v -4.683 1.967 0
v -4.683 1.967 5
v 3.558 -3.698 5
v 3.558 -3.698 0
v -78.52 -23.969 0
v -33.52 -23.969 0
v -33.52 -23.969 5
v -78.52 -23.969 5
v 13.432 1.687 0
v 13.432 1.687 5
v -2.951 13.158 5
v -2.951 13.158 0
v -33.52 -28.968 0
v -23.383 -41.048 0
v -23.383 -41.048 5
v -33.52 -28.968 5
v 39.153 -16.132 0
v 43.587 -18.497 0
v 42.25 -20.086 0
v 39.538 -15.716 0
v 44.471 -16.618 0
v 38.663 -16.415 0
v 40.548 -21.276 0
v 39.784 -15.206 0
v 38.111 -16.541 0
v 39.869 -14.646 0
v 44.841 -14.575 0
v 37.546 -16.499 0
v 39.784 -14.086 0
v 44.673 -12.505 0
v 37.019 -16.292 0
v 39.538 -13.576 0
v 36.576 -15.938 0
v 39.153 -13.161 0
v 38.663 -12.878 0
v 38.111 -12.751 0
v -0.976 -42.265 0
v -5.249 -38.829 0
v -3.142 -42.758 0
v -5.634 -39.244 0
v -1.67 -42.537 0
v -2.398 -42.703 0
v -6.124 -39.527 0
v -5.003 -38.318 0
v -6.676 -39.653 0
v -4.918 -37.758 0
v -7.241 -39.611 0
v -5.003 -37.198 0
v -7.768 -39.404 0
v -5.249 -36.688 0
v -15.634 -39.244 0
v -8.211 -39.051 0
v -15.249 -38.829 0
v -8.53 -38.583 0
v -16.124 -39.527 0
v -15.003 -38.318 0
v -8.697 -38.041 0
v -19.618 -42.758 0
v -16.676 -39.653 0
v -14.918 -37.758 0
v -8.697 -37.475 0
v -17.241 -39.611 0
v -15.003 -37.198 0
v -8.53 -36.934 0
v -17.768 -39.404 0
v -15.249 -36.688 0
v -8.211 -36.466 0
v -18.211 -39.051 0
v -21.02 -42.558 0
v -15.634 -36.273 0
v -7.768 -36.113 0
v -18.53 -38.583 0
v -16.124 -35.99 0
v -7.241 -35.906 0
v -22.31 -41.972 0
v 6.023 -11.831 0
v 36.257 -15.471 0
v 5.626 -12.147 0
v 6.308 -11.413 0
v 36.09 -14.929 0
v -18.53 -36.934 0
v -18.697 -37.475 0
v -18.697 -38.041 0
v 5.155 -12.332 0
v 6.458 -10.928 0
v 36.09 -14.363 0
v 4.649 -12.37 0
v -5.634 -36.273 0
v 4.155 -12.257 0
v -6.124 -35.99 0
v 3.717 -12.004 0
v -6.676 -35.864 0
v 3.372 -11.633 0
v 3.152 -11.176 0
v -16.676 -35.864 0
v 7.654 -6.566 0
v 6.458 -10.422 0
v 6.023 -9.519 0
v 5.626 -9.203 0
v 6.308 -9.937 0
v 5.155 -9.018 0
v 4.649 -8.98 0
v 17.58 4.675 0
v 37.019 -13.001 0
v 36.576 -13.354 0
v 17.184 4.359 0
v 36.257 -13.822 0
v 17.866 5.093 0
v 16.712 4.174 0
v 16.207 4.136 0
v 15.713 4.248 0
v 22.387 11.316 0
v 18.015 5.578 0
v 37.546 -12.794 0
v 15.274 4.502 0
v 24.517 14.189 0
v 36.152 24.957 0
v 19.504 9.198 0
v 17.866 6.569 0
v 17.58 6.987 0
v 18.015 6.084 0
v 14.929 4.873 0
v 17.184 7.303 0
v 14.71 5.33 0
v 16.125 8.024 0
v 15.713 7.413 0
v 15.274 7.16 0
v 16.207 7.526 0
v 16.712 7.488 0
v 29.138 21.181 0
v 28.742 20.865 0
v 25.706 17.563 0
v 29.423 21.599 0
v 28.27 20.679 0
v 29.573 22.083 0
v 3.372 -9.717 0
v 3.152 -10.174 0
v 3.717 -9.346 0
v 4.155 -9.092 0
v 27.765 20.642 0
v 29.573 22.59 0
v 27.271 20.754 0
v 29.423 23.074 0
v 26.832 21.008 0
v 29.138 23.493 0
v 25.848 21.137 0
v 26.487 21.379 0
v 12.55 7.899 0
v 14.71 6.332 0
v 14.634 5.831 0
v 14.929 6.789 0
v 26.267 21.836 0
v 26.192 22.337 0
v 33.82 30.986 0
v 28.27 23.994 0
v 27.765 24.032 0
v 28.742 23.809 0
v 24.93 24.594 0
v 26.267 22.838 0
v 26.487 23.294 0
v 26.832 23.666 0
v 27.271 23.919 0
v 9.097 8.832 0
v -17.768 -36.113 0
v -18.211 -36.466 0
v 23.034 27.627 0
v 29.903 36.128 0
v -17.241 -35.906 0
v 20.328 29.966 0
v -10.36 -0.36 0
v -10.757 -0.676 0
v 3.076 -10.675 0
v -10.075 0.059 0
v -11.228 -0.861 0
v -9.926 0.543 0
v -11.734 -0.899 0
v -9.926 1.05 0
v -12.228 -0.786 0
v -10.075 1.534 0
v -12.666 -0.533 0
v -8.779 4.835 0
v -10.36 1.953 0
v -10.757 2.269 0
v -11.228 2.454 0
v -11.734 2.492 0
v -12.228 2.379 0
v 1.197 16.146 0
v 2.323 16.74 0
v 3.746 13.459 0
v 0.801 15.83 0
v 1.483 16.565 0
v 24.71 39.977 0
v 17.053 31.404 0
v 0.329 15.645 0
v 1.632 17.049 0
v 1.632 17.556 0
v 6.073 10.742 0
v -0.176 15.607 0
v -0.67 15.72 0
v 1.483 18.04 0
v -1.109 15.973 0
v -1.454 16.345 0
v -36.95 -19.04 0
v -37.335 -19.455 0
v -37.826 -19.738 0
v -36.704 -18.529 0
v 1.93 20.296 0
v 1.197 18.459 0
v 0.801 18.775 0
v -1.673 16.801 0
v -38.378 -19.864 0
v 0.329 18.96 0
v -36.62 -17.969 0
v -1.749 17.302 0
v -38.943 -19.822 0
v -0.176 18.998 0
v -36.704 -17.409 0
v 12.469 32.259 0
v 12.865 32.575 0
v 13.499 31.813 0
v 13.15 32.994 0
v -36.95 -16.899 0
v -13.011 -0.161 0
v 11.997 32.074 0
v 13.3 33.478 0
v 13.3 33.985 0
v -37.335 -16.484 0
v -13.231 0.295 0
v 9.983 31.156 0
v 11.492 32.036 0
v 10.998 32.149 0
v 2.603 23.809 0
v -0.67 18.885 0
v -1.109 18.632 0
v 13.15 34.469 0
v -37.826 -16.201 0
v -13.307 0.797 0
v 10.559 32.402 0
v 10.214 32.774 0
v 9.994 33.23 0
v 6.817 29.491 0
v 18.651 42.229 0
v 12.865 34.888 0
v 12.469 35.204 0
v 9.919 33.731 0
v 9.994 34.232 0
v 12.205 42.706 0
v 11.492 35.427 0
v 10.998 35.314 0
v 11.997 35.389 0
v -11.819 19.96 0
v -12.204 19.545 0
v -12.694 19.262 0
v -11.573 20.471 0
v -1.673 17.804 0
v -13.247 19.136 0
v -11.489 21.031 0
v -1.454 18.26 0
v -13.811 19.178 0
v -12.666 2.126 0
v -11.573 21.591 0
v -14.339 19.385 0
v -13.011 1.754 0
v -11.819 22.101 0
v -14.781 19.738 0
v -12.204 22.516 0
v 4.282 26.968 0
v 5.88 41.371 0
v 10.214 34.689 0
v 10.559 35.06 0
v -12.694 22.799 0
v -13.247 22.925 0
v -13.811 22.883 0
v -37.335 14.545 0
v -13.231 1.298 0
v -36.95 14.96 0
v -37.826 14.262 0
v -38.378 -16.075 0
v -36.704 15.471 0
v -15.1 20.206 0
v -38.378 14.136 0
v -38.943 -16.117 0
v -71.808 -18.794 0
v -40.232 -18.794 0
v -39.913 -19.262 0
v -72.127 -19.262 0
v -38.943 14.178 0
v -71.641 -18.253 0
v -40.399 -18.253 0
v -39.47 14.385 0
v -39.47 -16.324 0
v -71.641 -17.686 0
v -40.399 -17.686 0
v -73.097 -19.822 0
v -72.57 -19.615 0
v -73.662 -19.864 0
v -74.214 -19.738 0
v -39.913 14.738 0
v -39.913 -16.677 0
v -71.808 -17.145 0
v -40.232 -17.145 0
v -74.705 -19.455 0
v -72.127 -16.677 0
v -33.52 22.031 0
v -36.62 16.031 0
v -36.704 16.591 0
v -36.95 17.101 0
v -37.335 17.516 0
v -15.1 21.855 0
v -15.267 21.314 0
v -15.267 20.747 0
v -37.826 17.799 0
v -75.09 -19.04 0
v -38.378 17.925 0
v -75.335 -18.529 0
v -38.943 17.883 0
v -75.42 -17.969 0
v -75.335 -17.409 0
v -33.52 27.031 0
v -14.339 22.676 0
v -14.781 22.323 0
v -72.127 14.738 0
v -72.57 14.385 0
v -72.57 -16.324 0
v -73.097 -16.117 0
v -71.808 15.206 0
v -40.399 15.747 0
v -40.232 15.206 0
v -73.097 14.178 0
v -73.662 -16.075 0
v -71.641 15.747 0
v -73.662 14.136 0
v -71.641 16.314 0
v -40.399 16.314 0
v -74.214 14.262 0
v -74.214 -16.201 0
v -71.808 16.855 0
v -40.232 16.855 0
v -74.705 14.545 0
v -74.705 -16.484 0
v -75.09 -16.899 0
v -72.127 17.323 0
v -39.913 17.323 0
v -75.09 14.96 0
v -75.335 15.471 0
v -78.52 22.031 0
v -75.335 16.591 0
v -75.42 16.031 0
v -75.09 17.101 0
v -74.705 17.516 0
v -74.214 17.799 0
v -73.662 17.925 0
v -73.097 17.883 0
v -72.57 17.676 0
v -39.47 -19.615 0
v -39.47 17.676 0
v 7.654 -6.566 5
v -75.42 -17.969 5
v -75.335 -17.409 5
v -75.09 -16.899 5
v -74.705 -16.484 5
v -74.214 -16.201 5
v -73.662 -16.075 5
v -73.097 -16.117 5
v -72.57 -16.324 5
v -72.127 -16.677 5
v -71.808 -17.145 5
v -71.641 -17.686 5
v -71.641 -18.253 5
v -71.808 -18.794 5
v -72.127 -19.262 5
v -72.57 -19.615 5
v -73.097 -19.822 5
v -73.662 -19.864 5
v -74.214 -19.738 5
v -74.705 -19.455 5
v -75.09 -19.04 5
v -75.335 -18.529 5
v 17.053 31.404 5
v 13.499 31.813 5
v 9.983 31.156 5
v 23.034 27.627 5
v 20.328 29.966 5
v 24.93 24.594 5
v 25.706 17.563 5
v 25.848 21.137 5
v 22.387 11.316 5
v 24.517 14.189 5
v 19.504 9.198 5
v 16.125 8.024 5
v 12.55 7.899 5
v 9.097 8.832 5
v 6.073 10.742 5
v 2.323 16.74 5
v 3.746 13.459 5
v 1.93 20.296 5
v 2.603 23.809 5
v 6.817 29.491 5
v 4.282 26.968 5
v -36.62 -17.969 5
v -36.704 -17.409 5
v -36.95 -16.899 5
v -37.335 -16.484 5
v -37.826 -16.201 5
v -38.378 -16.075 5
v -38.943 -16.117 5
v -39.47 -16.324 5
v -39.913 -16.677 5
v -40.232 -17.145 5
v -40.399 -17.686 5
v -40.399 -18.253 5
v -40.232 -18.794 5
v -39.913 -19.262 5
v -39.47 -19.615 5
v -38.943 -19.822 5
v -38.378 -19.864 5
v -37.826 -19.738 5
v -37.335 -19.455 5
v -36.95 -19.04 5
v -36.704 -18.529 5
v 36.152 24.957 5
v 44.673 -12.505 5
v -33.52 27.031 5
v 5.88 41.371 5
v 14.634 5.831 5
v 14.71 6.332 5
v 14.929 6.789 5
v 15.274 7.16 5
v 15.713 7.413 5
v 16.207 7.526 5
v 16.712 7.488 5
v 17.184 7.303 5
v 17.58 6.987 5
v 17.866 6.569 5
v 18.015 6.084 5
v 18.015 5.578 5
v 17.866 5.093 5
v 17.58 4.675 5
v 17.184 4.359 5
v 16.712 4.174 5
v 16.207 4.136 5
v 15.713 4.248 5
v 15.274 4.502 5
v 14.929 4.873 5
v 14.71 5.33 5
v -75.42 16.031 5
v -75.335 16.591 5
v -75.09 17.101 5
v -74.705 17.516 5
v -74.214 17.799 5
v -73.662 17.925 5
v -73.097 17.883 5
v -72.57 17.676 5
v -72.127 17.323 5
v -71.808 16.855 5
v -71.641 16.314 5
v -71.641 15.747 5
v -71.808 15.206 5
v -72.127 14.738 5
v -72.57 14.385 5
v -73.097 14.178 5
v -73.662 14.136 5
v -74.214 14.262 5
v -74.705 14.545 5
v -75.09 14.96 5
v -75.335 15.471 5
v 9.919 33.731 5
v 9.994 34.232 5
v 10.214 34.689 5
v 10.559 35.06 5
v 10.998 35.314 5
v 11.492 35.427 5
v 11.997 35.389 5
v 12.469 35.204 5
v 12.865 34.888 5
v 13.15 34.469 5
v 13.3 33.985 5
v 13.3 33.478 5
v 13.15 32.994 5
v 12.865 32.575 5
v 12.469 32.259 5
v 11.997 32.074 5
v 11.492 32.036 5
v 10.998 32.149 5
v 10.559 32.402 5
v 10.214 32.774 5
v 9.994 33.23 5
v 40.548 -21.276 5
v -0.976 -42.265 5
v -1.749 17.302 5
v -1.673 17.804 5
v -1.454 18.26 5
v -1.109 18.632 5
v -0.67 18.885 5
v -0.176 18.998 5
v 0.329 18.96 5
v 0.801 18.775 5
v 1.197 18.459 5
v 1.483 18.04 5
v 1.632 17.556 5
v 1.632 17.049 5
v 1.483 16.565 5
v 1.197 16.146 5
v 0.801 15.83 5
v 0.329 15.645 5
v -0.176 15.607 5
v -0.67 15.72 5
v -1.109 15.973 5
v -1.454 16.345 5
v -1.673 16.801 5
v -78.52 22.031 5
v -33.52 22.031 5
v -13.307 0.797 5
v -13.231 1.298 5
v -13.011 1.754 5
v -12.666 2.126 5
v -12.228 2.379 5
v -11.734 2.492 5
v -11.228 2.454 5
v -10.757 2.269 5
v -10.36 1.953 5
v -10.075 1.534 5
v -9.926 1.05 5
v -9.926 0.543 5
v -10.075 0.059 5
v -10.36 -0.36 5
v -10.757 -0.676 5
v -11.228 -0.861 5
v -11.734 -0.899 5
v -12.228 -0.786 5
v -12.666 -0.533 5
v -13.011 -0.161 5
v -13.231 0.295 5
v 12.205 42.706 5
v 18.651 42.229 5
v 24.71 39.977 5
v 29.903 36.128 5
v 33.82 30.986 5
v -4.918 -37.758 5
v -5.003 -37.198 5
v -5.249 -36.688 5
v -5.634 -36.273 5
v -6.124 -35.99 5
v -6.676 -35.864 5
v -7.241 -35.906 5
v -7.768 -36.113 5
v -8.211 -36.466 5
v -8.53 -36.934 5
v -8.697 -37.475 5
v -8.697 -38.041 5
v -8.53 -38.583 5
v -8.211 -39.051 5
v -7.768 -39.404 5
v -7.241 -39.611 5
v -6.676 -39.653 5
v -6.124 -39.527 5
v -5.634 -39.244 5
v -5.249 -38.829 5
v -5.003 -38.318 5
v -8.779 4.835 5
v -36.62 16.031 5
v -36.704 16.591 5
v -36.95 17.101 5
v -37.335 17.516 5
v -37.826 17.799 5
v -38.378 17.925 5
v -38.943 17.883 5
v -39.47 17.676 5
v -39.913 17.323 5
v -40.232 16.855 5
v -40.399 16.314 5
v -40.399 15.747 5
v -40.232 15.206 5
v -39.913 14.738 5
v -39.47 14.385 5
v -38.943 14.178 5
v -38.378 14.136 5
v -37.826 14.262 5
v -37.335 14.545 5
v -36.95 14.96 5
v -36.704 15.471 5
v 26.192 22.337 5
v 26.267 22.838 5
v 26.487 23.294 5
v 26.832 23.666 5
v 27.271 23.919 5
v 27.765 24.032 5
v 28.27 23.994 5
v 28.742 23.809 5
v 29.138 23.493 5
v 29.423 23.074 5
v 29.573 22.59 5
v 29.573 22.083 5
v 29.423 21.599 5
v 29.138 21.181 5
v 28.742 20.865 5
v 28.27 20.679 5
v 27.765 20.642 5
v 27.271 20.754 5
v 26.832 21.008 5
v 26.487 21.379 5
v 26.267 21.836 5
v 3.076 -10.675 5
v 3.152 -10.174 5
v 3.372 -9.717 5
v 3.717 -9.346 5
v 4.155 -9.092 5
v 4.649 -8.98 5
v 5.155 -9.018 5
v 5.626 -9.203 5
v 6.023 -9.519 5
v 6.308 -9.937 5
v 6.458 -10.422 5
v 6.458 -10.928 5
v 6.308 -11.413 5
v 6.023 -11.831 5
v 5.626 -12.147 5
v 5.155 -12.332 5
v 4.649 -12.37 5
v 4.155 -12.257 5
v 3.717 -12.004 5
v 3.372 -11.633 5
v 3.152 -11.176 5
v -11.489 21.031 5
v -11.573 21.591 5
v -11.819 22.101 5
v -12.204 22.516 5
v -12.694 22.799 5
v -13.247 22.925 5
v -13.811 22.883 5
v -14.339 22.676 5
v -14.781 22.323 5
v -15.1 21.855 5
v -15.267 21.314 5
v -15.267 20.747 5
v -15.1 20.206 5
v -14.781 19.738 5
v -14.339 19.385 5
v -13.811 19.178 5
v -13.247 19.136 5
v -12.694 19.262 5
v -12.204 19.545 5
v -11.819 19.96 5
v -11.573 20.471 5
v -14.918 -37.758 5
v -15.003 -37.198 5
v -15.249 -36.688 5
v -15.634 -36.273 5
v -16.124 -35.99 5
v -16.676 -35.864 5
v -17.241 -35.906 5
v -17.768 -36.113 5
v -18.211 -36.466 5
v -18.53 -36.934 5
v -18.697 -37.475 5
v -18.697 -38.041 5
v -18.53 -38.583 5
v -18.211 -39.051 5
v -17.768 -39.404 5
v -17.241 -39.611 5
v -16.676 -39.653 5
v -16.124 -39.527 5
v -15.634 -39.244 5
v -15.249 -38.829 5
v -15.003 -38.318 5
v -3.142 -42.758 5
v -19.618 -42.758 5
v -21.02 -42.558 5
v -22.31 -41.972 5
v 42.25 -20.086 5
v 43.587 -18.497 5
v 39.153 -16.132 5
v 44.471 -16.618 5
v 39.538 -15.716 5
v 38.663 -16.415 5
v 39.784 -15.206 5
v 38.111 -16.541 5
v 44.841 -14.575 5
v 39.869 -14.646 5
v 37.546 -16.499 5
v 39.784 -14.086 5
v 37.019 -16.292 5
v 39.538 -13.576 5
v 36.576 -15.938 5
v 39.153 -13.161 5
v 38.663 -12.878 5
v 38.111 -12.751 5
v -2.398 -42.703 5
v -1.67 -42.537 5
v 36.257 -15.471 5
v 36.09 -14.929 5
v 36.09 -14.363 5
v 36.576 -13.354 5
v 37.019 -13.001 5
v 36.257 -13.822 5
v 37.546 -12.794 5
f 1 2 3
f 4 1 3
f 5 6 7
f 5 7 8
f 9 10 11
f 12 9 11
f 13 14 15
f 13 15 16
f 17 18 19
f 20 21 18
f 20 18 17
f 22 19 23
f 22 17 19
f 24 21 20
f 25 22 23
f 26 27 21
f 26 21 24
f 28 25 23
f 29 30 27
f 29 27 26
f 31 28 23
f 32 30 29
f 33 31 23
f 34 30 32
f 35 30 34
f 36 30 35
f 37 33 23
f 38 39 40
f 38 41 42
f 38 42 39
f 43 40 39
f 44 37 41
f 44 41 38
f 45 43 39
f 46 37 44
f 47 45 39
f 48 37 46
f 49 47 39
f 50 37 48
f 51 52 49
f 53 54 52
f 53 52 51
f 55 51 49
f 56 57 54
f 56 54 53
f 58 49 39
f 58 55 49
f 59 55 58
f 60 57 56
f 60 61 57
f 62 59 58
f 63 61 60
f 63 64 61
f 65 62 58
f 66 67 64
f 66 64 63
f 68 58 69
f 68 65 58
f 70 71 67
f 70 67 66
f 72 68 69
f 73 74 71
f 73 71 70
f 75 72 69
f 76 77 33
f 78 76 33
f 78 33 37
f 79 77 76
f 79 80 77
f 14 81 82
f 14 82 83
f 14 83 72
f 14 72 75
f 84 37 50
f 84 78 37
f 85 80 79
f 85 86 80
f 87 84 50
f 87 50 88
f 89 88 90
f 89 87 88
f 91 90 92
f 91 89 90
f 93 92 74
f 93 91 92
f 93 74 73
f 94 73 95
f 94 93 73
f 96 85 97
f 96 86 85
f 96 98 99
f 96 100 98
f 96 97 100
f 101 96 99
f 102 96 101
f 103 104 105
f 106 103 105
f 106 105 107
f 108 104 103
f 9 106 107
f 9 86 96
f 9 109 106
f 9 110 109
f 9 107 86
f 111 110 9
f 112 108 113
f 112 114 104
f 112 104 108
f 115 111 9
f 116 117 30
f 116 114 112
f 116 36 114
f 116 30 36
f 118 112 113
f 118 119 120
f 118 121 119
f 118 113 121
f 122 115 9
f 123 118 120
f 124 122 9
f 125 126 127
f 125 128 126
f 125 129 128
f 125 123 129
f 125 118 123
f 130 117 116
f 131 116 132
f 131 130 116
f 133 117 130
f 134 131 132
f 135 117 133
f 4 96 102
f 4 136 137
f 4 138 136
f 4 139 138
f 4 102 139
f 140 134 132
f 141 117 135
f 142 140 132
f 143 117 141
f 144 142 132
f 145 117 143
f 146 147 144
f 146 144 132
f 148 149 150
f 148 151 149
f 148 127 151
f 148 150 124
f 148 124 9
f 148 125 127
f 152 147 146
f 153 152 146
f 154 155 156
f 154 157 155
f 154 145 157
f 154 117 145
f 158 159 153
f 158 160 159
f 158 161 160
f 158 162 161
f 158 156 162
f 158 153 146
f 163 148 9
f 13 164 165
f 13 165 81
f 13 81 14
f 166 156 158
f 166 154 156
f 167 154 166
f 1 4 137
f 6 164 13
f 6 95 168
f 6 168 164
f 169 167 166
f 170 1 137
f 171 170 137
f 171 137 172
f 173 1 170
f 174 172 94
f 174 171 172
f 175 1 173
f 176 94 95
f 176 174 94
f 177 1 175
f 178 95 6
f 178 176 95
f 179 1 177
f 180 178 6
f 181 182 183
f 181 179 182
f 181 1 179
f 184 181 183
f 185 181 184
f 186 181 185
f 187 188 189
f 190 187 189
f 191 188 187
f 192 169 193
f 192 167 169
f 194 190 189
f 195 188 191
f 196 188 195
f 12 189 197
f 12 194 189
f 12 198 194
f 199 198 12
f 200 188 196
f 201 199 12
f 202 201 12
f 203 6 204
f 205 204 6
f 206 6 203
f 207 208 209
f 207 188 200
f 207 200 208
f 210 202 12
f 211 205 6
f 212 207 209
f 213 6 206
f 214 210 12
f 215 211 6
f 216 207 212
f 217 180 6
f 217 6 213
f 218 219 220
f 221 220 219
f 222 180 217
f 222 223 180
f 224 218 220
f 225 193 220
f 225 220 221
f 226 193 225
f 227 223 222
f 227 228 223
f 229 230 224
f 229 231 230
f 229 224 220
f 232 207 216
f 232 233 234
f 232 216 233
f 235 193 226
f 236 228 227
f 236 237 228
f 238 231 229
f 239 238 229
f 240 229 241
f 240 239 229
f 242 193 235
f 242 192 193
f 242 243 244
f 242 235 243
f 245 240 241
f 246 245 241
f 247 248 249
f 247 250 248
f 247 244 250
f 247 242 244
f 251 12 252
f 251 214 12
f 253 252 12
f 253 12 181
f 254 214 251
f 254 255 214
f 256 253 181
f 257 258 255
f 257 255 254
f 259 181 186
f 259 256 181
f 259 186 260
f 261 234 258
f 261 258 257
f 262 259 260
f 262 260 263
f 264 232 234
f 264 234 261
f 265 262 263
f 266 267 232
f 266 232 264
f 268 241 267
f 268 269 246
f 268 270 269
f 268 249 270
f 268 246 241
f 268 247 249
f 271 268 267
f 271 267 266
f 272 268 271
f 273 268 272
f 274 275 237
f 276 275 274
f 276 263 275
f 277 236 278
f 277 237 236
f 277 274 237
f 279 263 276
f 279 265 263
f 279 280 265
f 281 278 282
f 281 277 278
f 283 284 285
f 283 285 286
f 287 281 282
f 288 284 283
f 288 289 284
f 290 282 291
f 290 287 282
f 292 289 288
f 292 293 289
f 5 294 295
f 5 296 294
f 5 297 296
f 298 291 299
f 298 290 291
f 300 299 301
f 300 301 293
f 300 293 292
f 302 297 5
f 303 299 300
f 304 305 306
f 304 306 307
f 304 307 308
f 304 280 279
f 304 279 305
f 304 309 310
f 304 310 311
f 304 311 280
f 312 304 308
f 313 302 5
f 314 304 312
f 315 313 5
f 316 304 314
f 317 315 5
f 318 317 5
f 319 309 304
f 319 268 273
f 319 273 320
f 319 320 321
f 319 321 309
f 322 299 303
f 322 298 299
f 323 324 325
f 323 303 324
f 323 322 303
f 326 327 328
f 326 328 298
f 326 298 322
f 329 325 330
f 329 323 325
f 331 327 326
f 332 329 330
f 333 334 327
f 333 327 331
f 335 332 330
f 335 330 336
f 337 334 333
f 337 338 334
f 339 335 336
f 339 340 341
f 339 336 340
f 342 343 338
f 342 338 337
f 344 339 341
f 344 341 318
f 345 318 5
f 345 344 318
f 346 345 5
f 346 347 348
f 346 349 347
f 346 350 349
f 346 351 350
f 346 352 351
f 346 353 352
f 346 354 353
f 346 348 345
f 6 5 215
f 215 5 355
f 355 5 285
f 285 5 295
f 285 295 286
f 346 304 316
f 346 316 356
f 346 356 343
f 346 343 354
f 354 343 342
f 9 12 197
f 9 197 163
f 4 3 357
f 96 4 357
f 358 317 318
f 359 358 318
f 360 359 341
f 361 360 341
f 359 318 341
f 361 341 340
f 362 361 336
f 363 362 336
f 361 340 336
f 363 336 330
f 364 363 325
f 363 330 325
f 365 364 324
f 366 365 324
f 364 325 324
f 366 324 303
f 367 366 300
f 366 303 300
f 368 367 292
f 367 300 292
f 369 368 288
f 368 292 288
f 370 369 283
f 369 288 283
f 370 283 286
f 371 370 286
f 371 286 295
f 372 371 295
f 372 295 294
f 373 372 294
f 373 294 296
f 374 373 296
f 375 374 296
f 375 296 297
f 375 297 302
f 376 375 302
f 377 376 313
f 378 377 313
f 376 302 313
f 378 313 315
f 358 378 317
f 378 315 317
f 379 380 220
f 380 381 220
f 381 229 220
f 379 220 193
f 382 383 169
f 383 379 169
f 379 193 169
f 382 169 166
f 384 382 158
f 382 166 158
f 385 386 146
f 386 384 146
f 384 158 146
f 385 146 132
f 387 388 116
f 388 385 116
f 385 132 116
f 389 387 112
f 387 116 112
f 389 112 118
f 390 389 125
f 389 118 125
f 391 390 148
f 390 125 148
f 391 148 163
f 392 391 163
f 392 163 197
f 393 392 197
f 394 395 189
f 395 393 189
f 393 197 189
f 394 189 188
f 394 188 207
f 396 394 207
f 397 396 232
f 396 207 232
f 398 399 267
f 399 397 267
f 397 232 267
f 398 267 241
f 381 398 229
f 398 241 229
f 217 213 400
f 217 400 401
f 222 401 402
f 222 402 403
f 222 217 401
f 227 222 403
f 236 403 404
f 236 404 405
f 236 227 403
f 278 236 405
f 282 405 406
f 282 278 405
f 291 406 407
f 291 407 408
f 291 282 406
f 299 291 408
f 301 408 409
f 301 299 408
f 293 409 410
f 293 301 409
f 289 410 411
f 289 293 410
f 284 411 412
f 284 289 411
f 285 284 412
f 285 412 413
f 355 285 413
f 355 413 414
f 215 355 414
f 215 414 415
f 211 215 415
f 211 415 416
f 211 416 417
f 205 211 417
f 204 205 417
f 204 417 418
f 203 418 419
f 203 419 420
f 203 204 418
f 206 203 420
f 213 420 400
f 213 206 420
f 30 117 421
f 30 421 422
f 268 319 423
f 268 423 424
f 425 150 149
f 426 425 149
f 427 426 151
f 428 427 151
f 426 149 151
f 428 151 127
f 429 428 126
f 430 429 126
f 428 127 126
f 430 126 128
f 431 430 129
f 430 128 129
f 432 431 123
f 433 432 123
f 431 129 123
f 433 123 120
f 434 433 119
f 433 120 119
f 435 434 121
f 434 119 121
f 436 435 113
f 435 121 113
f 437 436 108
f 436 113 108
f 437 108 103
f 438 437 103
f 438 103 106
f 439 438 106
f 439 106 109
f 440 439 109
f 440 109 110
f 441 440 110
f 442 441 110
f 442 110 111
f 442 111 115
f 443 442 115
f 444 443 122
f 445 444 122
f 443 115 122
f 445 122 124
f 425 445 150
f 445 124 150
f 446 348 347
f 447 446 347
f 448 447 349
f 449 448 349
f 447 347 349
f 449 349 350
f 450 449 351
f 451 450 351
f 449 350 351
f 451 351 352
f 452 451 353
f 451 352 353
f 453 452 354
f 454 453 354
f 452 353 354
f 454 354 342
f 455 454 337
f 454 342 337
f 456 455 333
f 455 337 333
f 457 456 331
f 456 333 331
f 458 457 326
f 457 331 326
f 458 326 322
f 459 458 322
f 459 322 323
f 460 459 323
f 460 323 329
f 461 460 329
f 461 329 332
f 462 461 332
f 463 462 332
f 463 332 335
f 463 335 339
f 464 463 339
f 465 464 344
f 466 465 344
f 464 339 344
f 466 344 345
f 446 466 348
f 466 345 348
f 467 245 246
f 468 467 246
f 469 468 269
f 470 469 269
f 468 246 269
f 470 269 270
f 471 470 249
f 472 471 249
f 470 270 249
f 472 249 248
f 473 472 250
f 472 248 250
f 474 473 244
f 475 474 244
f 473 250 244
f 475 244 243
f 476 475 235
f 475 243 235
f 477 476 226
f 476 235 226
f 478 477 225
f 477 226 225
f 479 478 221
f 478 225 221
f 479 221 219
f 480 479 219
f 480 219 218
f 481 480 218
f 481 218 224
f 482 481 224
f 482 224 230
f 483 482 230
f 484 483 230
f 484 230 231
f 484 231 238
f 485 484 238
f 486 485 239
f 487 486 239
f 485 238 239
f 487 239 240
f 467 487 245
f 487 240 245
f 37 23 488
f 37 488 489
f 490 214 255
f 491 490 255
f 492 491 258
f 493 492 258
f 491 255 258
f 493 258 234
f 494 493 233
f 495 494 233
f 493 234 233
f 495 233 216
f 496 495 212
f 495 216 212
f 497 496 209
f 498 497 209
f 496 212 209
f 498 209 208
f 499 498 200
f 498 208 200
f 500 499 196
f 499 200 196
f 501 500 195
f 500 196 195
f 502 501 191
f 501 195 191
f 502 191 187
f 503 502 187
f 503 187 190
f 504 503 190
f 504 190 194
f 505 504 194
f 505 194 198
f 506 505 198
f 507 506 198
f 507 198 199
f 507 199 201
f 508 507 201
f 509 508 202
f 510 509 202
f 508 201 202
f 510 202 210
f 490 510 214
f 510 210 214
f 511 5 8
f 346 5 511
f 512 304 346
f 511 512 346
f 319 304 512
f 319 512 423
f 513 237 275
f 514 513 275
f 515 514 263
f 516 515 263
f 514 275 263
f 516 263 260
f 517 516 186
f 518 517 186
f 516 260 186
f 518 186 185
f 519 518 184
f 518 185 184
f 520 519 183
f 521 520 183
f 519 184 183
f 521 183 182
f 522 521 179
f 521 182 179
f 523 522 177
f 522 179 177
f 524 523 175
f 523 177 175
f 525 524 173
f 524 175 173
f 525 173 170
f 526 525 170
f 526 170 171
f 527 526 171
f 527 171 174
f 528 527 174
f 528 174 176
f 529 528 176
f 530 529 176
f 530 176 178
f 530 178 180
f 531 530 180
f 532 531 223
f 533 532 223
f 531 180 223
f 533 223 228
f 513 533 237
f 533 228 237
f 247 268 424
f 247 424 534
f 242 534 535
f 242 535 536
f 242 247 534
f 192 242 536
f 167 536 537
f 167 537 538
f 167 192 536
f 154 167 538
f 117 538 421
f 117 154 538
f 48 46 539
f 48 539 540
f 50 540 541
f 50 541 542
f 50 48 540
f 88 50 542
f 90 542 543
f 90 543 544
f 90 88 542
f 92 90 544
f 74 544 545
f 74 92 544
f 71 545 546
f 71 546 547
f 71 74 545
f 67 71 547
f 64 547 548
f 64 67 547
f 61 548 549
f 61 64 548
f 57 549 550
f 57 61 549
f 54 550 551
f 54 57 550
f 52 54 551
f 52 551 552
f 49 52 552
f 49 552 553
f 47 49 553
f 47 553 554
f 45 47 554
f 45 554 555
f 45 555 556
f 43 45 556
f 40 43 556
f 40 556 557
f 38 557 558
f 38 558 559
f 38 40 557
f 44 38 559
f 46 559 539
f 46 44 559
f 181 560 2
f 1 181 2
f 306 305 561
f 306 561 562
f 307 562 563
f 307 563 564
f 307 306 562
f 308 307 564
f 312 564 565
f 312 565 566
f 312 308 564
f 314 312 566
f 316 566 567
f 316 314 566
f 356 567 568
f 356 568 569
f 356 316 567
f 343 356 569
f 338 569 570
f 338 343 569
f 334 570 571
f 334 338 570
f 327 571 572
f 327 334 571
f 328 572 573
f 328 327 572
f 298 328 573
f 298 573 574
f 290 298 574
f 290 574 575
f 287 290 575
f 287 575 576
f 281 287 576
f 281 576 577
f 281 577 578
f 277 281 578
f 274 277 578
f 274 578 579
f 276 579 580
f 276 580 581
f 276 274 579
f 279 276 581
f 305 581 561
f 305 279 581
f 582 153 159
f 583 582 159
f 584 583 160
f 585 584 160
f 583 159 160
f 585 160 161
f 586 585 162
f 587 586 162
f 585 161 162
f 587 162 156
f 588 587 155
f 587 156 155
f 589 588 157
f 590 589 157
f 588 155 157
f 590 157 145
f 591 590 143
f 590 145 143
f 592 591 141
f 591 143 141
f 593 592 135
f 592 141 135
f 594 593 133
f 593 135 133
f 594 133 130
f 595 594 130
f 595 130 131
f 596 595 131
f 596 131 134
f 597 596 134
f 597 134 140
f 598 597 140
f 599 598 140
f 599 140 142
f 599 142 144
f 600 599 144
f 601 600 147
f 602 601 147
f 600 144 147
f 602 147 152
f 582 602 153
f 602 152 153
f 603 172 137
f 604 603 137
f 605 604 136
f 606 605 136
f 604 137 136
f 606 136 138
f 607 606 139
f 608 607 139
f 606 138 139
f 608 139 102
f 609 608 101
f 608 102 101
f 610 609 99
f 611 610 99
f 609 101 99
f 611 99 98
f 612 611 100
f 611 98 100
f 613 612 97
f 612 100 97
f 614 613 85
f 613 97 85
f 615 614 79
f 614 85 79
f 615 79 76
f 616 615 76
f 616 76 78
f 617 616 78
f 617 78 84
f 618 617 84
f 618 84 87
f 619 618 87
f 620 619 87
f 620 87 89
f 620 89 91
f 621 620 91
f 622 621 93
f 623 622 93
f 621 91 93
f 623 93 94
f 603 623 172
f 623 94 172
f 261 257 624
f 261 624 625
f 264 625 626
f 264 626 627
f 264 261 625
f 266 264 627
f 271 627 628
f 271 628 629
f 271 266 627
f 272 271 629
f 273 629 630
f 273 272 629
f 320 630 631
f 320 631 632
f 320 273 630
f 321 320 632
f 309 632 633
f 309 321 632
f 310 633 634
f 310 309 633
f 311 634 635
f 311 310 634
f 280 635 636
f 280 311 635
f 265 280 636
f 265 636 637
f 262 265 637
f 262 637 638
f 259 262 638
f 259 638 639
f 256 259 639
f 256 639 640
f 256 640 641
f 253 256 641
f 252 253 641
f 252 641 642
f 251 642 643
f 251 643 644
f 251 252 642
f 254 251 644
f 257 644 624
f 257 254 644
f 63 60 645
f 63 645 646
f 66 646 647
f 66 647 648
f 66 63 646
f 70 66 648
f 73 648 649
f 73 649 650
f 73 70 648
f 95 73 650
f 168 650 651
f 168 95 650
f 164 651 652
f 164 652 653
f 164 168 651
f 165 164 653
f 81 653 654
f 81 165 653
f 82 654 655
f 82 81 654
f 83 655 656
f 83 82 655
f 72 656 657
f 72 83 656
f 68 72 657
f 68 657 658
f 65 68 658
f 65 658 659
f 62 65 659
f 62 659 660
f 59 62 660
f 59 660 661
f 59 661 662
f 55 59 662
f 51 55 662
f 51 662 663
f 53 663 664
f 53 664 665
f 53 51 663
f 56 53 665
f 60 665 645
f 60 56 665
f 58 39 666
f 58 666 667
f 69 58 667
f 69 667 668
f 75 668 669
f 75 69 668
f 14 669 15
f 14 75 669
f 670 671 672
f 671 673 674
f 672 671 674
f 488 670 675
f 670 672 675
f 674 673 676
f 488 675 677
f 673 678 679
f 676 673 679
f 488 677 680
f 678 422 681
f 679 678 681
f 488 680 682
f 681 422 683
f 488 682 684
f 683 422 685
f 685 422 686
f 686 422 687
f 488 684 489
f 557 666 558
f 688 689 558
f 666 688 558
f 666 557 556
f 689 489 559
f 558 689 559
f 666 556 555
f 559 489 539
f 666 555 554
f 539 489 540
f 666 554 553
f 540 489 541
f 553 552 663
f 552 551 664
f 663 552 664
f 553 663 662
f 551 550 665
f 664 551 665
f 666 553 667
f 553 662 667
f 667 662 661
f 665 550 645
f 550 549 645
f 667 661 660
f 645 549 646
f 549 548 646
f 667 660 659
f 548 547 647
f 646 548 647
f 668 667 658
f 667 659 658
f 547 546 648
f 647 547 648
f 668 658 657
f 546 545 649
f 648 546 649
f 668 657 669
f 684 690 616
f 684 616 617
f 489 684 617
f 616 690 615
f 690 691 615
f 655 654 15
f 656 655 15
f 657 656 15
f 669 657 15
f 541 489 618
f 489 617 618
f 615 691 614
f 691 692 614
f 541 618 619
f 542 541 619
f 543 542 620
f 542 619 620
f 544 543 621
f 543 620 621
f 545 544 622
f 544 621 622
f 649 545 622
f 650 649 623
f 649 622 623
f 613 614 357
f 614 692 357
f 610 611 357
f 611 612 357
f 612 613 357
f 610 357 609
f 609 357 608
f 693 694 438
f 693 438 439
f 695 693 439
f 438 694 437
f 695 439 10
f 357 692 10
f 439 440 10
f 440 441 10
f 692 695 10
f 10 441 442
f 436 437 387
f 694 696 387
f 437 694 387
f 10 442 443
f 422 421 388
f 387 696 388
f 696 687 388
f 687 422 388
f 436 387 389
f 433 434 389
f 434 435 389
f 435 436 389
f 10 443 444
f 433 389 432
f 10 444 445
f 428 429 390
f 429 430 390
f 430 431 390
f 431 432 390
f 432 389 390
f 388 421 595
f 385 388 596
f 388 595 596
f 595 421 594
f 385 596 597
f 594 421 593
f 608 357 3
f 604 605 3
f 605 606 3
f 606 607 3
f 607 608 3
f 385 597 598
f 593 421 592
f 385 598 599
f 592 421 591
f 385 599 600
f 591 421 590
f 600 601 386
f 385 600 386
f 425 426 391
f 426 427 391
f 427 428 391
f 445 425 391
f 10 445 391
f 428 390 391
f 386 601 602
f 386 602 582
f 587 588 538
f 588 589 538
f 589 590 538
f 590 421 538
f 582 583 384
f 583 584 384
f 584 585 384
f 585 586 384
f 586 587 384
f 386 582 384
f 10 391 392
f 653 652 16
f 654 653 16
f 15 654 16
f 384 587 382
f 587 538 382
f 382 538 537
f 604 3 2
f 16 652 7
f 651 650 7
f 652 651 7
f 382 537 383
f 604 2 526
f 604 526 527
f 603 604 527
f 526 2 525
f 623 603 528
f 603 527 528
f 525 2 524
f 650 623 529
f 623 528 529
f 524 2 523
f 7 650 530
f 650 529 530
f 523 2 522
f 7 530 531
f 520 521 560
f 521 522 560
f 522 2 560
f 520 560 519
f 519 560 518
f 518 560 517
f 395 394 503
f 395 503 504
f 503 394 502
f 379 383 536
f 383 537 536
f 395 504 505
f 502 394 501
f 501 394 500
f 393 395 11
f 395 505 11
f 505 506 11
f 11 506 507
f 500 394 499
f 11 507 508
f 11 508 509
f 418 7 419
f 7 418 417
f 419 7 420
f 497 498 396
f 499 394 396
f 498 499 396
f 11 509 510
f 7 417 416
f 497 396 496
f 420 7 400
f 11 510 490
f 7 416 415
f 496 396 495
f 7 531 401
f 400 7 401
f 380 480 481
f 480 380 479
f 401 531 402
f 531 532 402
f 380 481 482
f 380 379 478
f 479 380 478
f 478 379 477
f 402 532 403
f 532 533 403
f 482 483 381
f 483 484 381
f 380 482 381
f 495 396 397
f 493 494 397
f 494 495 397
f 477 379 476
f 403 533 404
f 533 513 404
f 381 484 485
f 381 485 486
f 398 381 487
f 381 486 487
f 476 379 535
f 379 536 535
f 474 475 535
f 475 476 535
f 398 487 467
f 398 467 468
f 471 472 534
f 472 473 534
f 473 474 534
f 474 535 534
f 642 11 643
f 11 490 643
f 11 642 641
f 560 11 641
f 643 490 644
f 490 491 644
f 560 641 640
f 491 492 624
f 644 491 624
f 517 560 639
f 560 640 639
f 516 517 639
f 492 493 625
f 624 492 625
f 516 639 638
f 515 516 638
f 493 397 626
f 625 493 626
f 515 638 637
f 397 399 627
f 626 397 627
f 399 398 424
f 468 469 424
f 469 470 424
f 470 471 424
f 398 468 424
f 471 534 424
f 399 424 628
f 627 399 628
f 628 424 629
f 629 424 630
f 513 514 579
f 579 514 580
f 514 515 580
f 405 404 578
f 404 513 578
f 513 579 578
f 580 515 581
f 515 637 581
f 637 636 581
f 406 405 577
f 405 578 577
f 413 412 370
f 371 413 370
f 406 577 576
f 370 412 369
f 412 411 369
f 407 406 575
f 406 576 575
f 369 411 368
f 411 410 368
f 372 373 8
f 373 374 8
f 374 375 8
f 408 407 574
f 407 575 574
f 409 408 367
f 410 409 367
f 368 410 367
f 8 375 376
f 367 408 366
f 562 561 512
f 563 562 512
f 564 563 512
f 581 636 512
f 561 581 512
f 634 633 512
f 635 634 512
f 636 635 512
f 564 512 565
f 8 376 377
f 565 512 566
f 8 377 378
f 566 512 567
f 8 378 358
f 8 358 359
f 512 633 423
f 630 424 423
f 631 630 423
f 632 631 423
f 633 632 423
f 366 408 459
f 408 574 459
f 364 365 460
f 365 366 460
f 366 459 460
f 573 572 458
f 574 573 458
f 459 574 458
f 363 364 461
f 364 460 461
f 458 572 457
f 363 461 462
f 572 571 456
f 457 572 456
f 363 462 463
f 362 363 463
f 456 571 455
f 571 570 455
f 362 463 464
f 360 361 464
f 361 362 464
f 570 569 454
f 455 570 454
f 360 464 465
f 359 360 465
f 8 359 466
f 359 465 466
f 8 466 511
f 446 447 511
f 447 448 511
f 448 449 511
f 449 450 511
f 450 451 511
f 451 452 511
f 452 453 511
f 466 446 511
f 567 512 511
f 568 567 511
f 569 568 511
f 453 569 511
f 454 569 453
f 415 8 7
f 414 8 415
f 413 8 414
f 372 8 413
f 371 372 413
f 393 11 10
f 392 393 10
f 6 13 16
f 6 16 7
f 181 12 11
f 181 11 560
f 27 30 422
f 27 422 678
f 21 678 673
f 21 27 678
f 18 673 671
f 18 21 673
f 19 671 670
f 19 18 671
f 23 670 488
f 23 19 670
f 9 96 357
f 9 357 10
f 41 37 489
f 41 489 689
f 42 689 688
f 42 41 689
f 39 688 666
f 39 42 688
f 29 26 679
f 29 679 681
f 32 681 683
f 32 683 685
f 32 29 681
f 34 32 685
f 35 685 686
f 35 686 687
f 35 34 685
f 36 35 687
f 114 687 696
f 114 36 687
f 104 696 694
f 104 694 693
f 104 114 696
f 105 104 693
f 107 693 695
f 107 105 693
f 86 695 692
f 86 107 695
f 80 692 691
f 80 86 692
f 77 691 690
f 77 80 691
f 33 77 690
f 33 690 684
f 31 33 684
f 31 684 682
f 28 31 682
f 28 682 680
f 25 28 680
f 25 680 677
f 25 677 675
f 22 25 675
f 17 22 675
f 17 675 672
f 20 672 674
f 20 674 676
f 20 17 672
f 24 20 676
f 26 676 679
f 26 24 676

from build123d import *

# Parameters (mm, degrees)
ESQUISSE1_R         = 1.9
BOSS_EXTRU_1_DEPTH  = 5
EXTRUDE_1_DEPTH     = 5
EXTRUDE_2_DEPTH     = 5
SKETCH_6_R          = 1.6
CUT_EXTRUDE_2_DEPTH = 5
EXTRUDE_4_DEPTH     = 5
CUT_EXTRUDE_3_DEPTH = 5
EXTRUDE_6_DEPTH     = 5
SKETCH_10_R         = 12
CUT_EXTRUDE_4_DEPTH = 5
SKETCH_11_R         = 12.59581588
SKETCH_11_R_2       = 8.721789125
EXTRUDE_7_DEPTH     = 5
SKETCH_12_R         = 12
CUT_EXTRUDE_5_DEPTH = 5
SKETCH_13_R         = 3.051220473
SKETCH_13_R_2       = 0.885355671
SKETCH_13_R_3       = 2.495868873
SKETCH_13_R_4       = 0.973791961
EXTRUDE_8_DEPTH     = 5
SKETCH_14_R         = 1.6
SKETCH_14_R_2       = 12
CUT_EXTRUDE_6_DEPTH = 5
EXTRUDE_START       = -5
EXTRUDE_9_DEPTH     = 5
SKETCH_16_R         = 1.7
CUT_EXTRUDE_7_DEPTH = 5
SKETCH_17_W         = 35
SKETCH_17_H         = 46
EXTRUDE_10_DEPTH    = 5
SKETCH_18_R         = 1.9
CUT_EXTRUDE_8_DEPTH = 5


# Read off the part's stored shape, not the designer's step: 凸台-拉伸9
with BuildPart() as part:
    # Esquisse1 → Boss.-Extru.1 (new body)
    with BuildSketch(Plane.XY):
        with BuildLine():
            Line((40.548338426, -21.276277818), (-0.975727052, -42.264773686))
            ThreePointArc((-0.975727052, -42.264773686), (-2.030907408, -42.633295828), (-3.141586831, -42.758217285))
            Line((-3.141586831, -42.758217285), (-19.618188193, -42.758217285))
            ThreePointArc((-19.618188193, -42.758217285), (-21.685859542, -42.310660648), (-23.383370665, -41.048112535))
            Line((-23.383370665, -41.048112535), (-33.519906154, -28.967859949))
            Line((-33.519906154, -28.967859949), (-33.519906154, -23.969415955))
            Line((-33.519906154, -23.969415955), (-43.519906154, -23.969415955))
            Line((-43.519906154, -23.969415955), (-43.519906154, 22.030584045))
            Line((-43.519906154, 22.030584045), (-33.519906154, 22.030584045))
            Line((-33.519906154, 22.030584045), (-33.519906154, 27.030582734))
            Line((-33.519906154, 27.030582734), (5.8804708, 41.371147503))
            ThreePointArc((5.8804708, 41.371147503), (24.71028401, 39.977143129), (36.151646844, 24.957145453))
            Line((36.151646844, 24.957145453), (44.672795688, -12.50542283))
            ThreePointArc((44.672795688, -12.50542283), (44.089997655, -17.586546272), (40.548338426, -21.276277818))
        make_face()
        with Locations((37.968513549, -14.646168575)):
            Circle(ESQUISSE1_R, mode=Mode.SUBTRACT)
        with Locations((26.290921771, 28.768039745)):
            Circle(ESQUISSE1_R, mode=Mode.SUBTRACT)
        with Locations((18.099401328, 34.503804109)):
            Circle(ESQUISSE1_R, mode=Mode.SUBTRACT)
        with Locations((-1.81432361, -11.370410425)):
            Circle(ESQUISSE1_R, mode=Mode.SUBTRACT)
        with Locations((-10.005844053, -5.634646061)):
            Circle(ESQUISSE1_R, mode=Mode.SUBTRACT)
        with Locations((-13.38853652, 21.030583318)):
            Circle(ESQUISSE1_R, mode=Mode.SUBTRACT)
        with Locations((-6.818359545, -37.758216658)):
            Circle(ESQUISSE1_R, mode=Mode.SUBTRACT)
        with Locations((-16.818359545, -37.758216658)):
            Circle(ESQUISSE1_R, mode=Mode.SUBTRACT)
        with Locations((-38.519906154, -17.969415955)):
            Circle(ESQUISSE1_R, mode=Mode.SUBTRACT)
        with Locations((-38.519906154, 16.030584045)):
            Circle(ESQUISSE1_R, mode=Mode.SUBTRACT)
        with BuildLine():
            Line((21.617307412, 29.328732493), (24.05500749, 32.810128977))
            ThreePointArc((24.05500749, 32.810128977), (23.766600359, 33.932469516), (22.625252159, 33.732091761))
            Line((22.625252159, 33.732091761), (20.187552449, 30.250695803))
            ThreePointArc((20.187552449, 30.250695803), (18.892160946, 29.381199086), (17.366350313, 29.706722658))
            Line((17.366350313, 29.706722658), (11.508582376, 33.808377058))
            Line((11.508582376, 33.808377058), (-11.606548602, 0.796549047))
            Line((-11.606548602, 0.796549047), (-5.749613357, -3.304522496))
            ThreePointArc((-5.749613357, -3.304522496), (-4.927150936, -4.595530225), (-5.258462389, -6.089979325))
            Line((-5.258462389, -6.089979325), (-7.696162511, -9.571375872))
            ThreePointArc((-7.696162511, -9.571375872), (-7.487422906, -10.755197269), (-6.303601509, -10.546457664))
            Line((-6.303601509, -10.546457664), (-3.865901833, -7.065061754))
            ThreePointArc((-3.865901833, -7.065061754), (-2.574894061, -6.242599111), (-1.080444801, -6.573910562))
            Line((-1.080444801, -6.573910562), (4.776491193, -10.67498149))
            Line((4.776491193, -10.67498149), (27.891620971, 22.336844808))
            Line((27.891620971, 22.336844808), (22.031293977, 26.440291454))
            ThreePointArc((22.031293977, 26.440291454), (21.198678089, 27.79484445), (21.617307412, 29.328732493))
        make_face(mode=Mode.SUBTRACT)
    extrude(amount=BOSS_EXTRU_1_DEPTH)

    # 草图3 → 凸台-拉伸1 (add)
    with BuildSketch(Plane.XY.offset(5)):
        Polygon((17.366350313, 29.706722658), (22.031293977, 26.440291454), (27.521539946, 34.281169324), (22.856520703, 37.547606144), align=None)
    extrude(amount=-EXTRUDE_1_DEPTH)

    # 草图4 → 凸台-拉伸2 (add)
    with BuildSketch(Plane.XY.offset(5)):
        Polygon((-5.749613357, -3.304522496), (-1.080444801, -6.573910562), (-5.905310476, -13.464530652), (-10.574479032, -10.195142586), align=None)
    extrude(amount=-EXTRUDE_2_DEPTH)

    # 草图6 → 切除-拉伸2 (cut)
    with BuildSketch(Plane.XY):
        with Locations((11.618629634, 33.731321117)):
            Circle(SKETCH_6_R)
        with Locations((27.891620971, 22.336844808)):
            Circle(SKETCH_6_R)
        with Locations((-11.606548602, 0.796549047)):
            Circle(SKETCH_6_R)
        with Locations((4.776491193, -10.67498149)):
            Circle(SKETCH_6_R)
        with Locations((16.334056082, 5.830931659)):
            Circle(SKETCH_6_R)
        with Locations((-0.048983113, 17.302463052)):
            Circle(SKETCH_6_R)
    extrude(amount=CUT_EXTRUDE_2_DEPTH, mode=Mode.SUBTRACT)

    # 草图7 → 凸台-拉伸4 (add)
    with BuildSketch(Plane(origin=(0, 0, 0), x_dir=(-1, 0, 0), z_dir=(0, 0, -1))):
        Polygon((-27.348574266, 25.536925262), (-13.960830243, 33.567092121), (-17.290103765, 39.11759468), (-30.677847788, 31.087427821), align=None)
        Polygon((-1.835596657, -11.454822901), (11.156296117, -1.885351923), (15.083921052, -7.217651078), (2.092028278, -16.787122056), align=None)
    extrude(amount=-EXTRUDE_4_DEPTH)

    # 草图8 → 切除-拉伸3 (cut)
    with BuildSketch(Plane(origin=(0, 0, 0), x_dir=(-1, 0, 0), z_dir=(0, 0, -1))):
        with BuildLine():
            ThreePointArc((-19.485360525, 10.331460788), (-15.741376215, 8.971828118), (-11.75865467, 9.034666013))
            Line((-11.75865467, 9.034666013), (-4.525140456, 14.099627228))
            ThreePointArc((-4.525140456, 14.099627228), (-3.329387761, 16.849491145), (-2.920679758, 19.820102839))
            ThreePointArc((-2.920679758, 19.820102839), (-2.965693001, 20.8142181), (-3.100364331, 21.800197297))
            Line((-3.100364331, 21.800197297), (-8.359233833, 29.310641244))
            ThreePointArc((-8.359233833, 29.310641244), (-12.101833808, 30.668687973), (-16.082707796, 30.605539073))
            Line((-16.082707796, 30.605539073), (-17.366350313, 29.706722658))
            Line((-17.366350313, 29.706722658), (-22.031293977, 26.440291454))
            Line((-22.031293977, 26.440291454), (-23.316220712, 25.540575737))
            ThreePointArc((-23.316220712, 25.540575737), (-24.737438626, 21.819534658), (-24.740319575, 17.836320031))
            Line((-24.740319575, 17.836320031), (-19.485360525, 10.331460788))
        make_face()
        with BuildLine():
            Line((-8.359233833, 29.310641244), (-3.100364331, 21.800197297))
            ThreePointArc((-3.100364331, 21.800197297), (-4.910007291, 26.129443667), (-8.359233833, 29.310641244))
        make_face()
        with BuildLine():
            ThreePointArc((-16.082707796, 30.605539073), (-20.230023119, 28.830773532), (-23.316220712, 25.540575737))
            Line((-23.316220712, 25.540575737), (-22.031293977, 26.440291454))
            Line((-22.031293977, 26.440291454), (-17.366350313, 29.706722658))
            Line((-17.366350313, 29.706722658), (-16.082707796, 30.605539073))
        make_face()
        with BuildLine():
            ThreePointArc((-24.740319575, 17.836320031), (-22.931352225, 13.510762011), (-19.485360525, 10.331460788))
            Line((-19.485360525, 10.331460788), (-24.740319575, 17.836320031))
        make_face()
    extrude(amount=-CUT_EXTRUDE_3_DEPTH, mode=Mode.SUBTRACT)

    # 草图9 → 凸台-拉伸6 (add)
    with BuildSketch(Plane(origin=(0, 0, 0), x_dir=(-1, 0, 0), z_dir=(0, 0, -1))):
        with BuildLine():
            ThreePointArc((-25.974969527, 19.599582888), (-25.771002401, 21.991557628), (-25.094991232, 24.295066831))
            Line((-25.094991269, 24.295066884), (-26.580977893, 23.254567382))
            ThreePointArc((-26.580977858, 23.254567332), (-26.365673891, 22.817974219), (-26.291620971, 22.336844808))
            ThreePointArc((-26.291620971, 22.336844808), (-26.472403636, 21.598047029), (-26.973898668, 21.02620154))
            Line((-26.973898668, 21.02620154), (-25.974969527, 19.599582888))
        make_face()
        with BuildLine():
            ThreePointArc((-11.976590293, 31.613327776), (-10.804649732, 31.354387066), (-9.664437004, 30.979673968))
            Line((-9.664437004, 30.979673968), (-10.692189677, 32.426825426))
            ThreePointArc((-10.692189677, 32.426825426), (-11.261577481, 32.17166931), (-11.885263309, 32.153694265))
            Line((-11.885263309, 32.153694265), (-11.976590293, 31.613327776))
        make_face()
        with BuildLine():
            ThreePointArc((-14.41526284, 31.773096587), (-13.191848686, 31.755455968), (-11.976590293, 31.613327776))
            Line((-11.976590293, 31.613327776), (-11.885263309, 32.153694265))
            ThreePointArc((-11.885263309, 32.153694265), (-12.4735091, 32.3788489), (-12.929272711, 32.813598543))
            Line((-12.929272711, 32.813598543), (-14.41526284, 31.773096587))
        make_face()
        with BuildLine():
            ThreePointArc((-1.261660013, 16.384740548), (-1.527626733, 17.575045871), (-0.877456843, 18.606958743))
            Line((-0.877456843, 18.606958743), (-1.982414842, 20.162820986))
            ThreePointArc((-1.982414842, 20.162820986), (-1.97786095, 19.971997834), (-1.976342858, 19.781126388))
            ThreePointArc((-1.976342858, 19.781126388), (-2.198741813, 17.481536505), (-2.85769513, 15.267184353))
            Line((-2.85769513, 15.267184353), (-1.261660013, 16.384740548))
        make_face()
        with BuildLine():
            Line((-16.067422406, 7.408558511), (-15.976095422, 7.948925))
            ThreePointArc((-15.976095422, 7.948925), (-17.128646557, 8.202569423), (-18.250709888, 8.568196954))
            Line((-18.250709888, 8.568196954), (-17.251778384, 7.141574927))
            ThreePointArc((-17.251778384, 7.141574927), (-16.685907128, 7.39176504), (-16.067422406, 7.408558511))
        make_face()
        with BuildLine():
            Line((-15.023412956, 6.748654164), (-13.537422544, 7.789156201))
            ThreePointArc((-13.537422544, 7.789156201), (-14.760836864, 7.806796797), (-15.976095422, 7.948925))
            Line((-15.976095422, 7.948925), (-16.067422406, 7.408558511))
            ThreePointArc((-16.067422406, 7.408558511), (-15.479176579, 7.183403853), (-15.023412956, 6.748654164))
        make_face()
    extrude(amount=-EXTRUDE_6_DEPTH)


with BuildPart() as extrude_6_piece_1:
    # of the separate pieces the step leaves, piece 1, a body of its own (extrude_6_pieces)
    add(part.part.solids().sort_by_distance((40.548338426, -21.276277818, 0))[0])


with BuildPart() as extrude_6_piece_2:
    # of the separate pieces the step leaves, piece 2, a body of its own (extrude_6_pieces)
    add(part.part.solids().sort_by_distance((2.85769513, 15.267184353, 0))[0])


with BuildPart() as cut_extrude_4_tool:
    # 草图10 → 切除-拉伸4 (new body)
    with BuildSketch(Plane(origin=(0, 0, 0), x_dir=(-1, 0, 0), z_dir=(0, 0, -1))):
        with Locations((-13.920679758, 19.820102839)):
            Circle(SKETCH_10_R)
    extrude(amount=-CUT_EXTRUDE_4_DEPTH)


with BuildPart() as extrude_6_piece_1_1:
    add(extrude_6_piece_1.part)

    # 切除-拉伸4: cut by cut_extrude_4_tool
    add(cut_extrude_4_tool.part, mode=Mode.SUBTRACT)



with BuildPart() as extrude_6_piece_2_1:
    add(extrude_6_piece_2.part)

    # 切除-拉伸4: cut by cut_extrude_4_tool
    add(cut_extrude_4_tool.part, mode=Mode.SUBTRACT)


with BuildPart() as extrude_6_piece_1_2:
    add(extrude_6_piece_1_1.part)

    add(extrude_6_piece_2_1.part)  # 凸台-拉伸7 merges 凸台-拉伸6 piece 2
    # 草图11 → 凸台-拉伸7 (add)
    with BuildSketch(Plane(origin=(0, 0, 0), x_dir=(-1, 0, 0), z_dir=(0, 0, -1))):
        with Locations((-13.920679758, 19.820102839)):
            Circle(SKETCH_11_R)
        with Locations((-13.920679758, 19.820102839)):
            Circle(SKETCH_11_R_2, mode=Mode.SUBTRACT)
    extrude(amount=-EXTRUDE_7_DEPTH)

    # 草图12 → 切除-拉伸5 (cut)
    with BuildSketch(Plane(origin=(0, 0, 0), x_dir=(-1, 0, 0), z_dir=(0, 0, -1))):
        with Locations((-13.920679758, 19.820102839)):
            Circle(SKETCH_12_R)
    extrude(amount=-CUT_EXTRUDE_5_DEPTH, mode=Mode.SUBTRACT)

    # 草图13 → 凸台-拉伸8 (add)
    # profile 1 of 2: a face of its own
    with BuildSketch(Plane(origin=(0, 0, 0), x_dir=(-1, 0, 0), z_dir=(0, 0, -1))):
        with Locations((-11.618629634, 33.731321117)):
            Circle(SKETCH_13_R)
        with Locations((-11.618629634, 33.731321117)):
            Circle(SKETCH_13_R_2, mode=Mode.SUBTRACT)
    # profile 2 of 2: a face of its own
    with BuildSketch(Plane(origin=(0, 0, 0), x_dir=(-1, 0, 0), z_dir=(0, 0, -1))):
        with Locations((0.048983113, 17.302463052)):
            Circle(SKETCH_13_R_3)
        with Locations((0.048983113, 17.302463052)):
            Circle(SKETCH_13_R_4, mode=Mode.SUBTRACT)
    extrude(amount=-EXTRUDE_8_DEPTH)

    # 草图14 → 切除-拉伸6 (cut)
    with BuildSketch(Plane(origin=(0, 0, 0), x_dir=(-1, 0, 0), z_dir=(0, 0, -1))):
        with Locations((-11.618629634, 33.731321117)):
            Circle(SKETCH_14_R)
        with Locations((0.048983113, 17.302463052)):
            Circle(SKETCH_14_R)
        with Locations((-13.920679758, 19.820102839)):
            Circle(SKETCH_14_R_2)
    extrude(amount=-CUT_EXTRUDE_6_DEPTH, mode=Mode.SUBTRACT)

    # 凸台-拉伸9 outline → 凸台-拉伸9 (add)
    with BuildSketch(Plane(origin=(0, 0, 0), x_dir=(-1, 0, 0), z_dir=(0, 0, -1)).offset(EXTRUDE_START)):
        with BuildLine():
            ThreePointArc((-5.694213495, -9.364338222), (-4.498653765, -9.099289146), (-3.465847518, -9.757259768))
            Line((-3.465847518, -9.757259768), (10.295905471, -0.121173451))
            ThreePointArc((10.295905471, -0.121173451), (10.030856176, 1.074386008), (10.688826299, 2.107192315))
            Line((10.688826299, 2.107192315), (8.778837554, 4.834938915))
            Line((8.778837554, 4.834938915), (4.683080137, 1.967056791))
            Line((4.683080137, 1.967056791), (-3.557784811, -3.698236488))
            Line((-3.557784811, -3.698236488), (-7.653546083, -6.566121311))
            Line((-7.653546083, -6.566121311), (-5.694213495, -9.364338222))
        make_face()
        with BuildLine():
            Line((-15.416333779, 4.520288391), (-13.432329414, 1.68683653))
            Line((-13.432329414, 1.68683653), (2.950709781, 13.158367923))
            Line((2.950709781, 13.158367923), (1.480554693, 15.257966967))
            ThreePointArc((1.480554693, 15.257966967), (-0.363835187, 14.84097113), (-1.971266959, 15.836874066))
            ThreePointArc((-1.971266959, 15.836874066), (-6.72465494, 9.482220826), (-14.334431516, 7.231084324))
            Line((-14.334431516, 7.231084324), (-15.023412956, 6.748654164))
            ThreePointArc((-15.023412956, 6.748654164), (-14.758363655, 5.553094702), (-15.416333779, 4.520288391))
        make_face()
    extrude(amount=EXTRUDE_9_DEPTH)

    # 草图16 → 切除-拉伸7 (cut)
    with BuildSketch(Plane(origin=(0, 0, 0), x_dir=(-1, 0, 0), z_dir=(0, 0, -1))):
        with Locations((-16.334056082, 5.830931659)):
            Circle(SKETCH_16_R)
        with Locations((-4.776491193, -10.67498149)):
            Circle(SKETCH_16_R)
        with Locations((11.606548602, 0.796549047)):
            Circle(SKETCH_16_R)
        with Locations((-11.618629634, 33.731321117)):
            Circle(SKETCH_16_R)
        with Locations((0.048983113, 17.302463052)):
            Circle(SKETCH_16_R)
        with Locations((-27.891620971, 22.336844808)):
            Circle(SKETCH_16_R)
    extrude(amount=-CUT_EXTRUDE_7_DEPTH, mode=Mode.SUBTRACT)

    # 草图17 → 凸台-拉伸10 (add)
    with BuildSketch(Plane(origin=(0, 0, 0), x_dir=(-1, 0, 0), z_dir=(0, 0, -1))):
        with Locations((61.019906154, -0.969415955)):
            Rectangle(SKETCH_17_W, SKETCH_17_H)
    extrude(amount=-EXTRUDE_10_DEPTH)

    # 草图18 → 切除-拉伸8 (cut)
    with BuildSketch(Plane(origin=(0, 0, 0), x_dir=(-1, 0, 0), z_dir=(0, 0, -1))):
        with Locations((73.519906154, 16.030584045)):
            Circle(SKETCH_18_R)
        with Locations((73.519906154, -17.969415955)):
            Circle(SKETCH_18_R)
    extrude(amount=-CUT_EXTRUDE_8_DEPTH, mode=Mode.SUBTRACT)


solid = extrude_6_piece_1_2.part
